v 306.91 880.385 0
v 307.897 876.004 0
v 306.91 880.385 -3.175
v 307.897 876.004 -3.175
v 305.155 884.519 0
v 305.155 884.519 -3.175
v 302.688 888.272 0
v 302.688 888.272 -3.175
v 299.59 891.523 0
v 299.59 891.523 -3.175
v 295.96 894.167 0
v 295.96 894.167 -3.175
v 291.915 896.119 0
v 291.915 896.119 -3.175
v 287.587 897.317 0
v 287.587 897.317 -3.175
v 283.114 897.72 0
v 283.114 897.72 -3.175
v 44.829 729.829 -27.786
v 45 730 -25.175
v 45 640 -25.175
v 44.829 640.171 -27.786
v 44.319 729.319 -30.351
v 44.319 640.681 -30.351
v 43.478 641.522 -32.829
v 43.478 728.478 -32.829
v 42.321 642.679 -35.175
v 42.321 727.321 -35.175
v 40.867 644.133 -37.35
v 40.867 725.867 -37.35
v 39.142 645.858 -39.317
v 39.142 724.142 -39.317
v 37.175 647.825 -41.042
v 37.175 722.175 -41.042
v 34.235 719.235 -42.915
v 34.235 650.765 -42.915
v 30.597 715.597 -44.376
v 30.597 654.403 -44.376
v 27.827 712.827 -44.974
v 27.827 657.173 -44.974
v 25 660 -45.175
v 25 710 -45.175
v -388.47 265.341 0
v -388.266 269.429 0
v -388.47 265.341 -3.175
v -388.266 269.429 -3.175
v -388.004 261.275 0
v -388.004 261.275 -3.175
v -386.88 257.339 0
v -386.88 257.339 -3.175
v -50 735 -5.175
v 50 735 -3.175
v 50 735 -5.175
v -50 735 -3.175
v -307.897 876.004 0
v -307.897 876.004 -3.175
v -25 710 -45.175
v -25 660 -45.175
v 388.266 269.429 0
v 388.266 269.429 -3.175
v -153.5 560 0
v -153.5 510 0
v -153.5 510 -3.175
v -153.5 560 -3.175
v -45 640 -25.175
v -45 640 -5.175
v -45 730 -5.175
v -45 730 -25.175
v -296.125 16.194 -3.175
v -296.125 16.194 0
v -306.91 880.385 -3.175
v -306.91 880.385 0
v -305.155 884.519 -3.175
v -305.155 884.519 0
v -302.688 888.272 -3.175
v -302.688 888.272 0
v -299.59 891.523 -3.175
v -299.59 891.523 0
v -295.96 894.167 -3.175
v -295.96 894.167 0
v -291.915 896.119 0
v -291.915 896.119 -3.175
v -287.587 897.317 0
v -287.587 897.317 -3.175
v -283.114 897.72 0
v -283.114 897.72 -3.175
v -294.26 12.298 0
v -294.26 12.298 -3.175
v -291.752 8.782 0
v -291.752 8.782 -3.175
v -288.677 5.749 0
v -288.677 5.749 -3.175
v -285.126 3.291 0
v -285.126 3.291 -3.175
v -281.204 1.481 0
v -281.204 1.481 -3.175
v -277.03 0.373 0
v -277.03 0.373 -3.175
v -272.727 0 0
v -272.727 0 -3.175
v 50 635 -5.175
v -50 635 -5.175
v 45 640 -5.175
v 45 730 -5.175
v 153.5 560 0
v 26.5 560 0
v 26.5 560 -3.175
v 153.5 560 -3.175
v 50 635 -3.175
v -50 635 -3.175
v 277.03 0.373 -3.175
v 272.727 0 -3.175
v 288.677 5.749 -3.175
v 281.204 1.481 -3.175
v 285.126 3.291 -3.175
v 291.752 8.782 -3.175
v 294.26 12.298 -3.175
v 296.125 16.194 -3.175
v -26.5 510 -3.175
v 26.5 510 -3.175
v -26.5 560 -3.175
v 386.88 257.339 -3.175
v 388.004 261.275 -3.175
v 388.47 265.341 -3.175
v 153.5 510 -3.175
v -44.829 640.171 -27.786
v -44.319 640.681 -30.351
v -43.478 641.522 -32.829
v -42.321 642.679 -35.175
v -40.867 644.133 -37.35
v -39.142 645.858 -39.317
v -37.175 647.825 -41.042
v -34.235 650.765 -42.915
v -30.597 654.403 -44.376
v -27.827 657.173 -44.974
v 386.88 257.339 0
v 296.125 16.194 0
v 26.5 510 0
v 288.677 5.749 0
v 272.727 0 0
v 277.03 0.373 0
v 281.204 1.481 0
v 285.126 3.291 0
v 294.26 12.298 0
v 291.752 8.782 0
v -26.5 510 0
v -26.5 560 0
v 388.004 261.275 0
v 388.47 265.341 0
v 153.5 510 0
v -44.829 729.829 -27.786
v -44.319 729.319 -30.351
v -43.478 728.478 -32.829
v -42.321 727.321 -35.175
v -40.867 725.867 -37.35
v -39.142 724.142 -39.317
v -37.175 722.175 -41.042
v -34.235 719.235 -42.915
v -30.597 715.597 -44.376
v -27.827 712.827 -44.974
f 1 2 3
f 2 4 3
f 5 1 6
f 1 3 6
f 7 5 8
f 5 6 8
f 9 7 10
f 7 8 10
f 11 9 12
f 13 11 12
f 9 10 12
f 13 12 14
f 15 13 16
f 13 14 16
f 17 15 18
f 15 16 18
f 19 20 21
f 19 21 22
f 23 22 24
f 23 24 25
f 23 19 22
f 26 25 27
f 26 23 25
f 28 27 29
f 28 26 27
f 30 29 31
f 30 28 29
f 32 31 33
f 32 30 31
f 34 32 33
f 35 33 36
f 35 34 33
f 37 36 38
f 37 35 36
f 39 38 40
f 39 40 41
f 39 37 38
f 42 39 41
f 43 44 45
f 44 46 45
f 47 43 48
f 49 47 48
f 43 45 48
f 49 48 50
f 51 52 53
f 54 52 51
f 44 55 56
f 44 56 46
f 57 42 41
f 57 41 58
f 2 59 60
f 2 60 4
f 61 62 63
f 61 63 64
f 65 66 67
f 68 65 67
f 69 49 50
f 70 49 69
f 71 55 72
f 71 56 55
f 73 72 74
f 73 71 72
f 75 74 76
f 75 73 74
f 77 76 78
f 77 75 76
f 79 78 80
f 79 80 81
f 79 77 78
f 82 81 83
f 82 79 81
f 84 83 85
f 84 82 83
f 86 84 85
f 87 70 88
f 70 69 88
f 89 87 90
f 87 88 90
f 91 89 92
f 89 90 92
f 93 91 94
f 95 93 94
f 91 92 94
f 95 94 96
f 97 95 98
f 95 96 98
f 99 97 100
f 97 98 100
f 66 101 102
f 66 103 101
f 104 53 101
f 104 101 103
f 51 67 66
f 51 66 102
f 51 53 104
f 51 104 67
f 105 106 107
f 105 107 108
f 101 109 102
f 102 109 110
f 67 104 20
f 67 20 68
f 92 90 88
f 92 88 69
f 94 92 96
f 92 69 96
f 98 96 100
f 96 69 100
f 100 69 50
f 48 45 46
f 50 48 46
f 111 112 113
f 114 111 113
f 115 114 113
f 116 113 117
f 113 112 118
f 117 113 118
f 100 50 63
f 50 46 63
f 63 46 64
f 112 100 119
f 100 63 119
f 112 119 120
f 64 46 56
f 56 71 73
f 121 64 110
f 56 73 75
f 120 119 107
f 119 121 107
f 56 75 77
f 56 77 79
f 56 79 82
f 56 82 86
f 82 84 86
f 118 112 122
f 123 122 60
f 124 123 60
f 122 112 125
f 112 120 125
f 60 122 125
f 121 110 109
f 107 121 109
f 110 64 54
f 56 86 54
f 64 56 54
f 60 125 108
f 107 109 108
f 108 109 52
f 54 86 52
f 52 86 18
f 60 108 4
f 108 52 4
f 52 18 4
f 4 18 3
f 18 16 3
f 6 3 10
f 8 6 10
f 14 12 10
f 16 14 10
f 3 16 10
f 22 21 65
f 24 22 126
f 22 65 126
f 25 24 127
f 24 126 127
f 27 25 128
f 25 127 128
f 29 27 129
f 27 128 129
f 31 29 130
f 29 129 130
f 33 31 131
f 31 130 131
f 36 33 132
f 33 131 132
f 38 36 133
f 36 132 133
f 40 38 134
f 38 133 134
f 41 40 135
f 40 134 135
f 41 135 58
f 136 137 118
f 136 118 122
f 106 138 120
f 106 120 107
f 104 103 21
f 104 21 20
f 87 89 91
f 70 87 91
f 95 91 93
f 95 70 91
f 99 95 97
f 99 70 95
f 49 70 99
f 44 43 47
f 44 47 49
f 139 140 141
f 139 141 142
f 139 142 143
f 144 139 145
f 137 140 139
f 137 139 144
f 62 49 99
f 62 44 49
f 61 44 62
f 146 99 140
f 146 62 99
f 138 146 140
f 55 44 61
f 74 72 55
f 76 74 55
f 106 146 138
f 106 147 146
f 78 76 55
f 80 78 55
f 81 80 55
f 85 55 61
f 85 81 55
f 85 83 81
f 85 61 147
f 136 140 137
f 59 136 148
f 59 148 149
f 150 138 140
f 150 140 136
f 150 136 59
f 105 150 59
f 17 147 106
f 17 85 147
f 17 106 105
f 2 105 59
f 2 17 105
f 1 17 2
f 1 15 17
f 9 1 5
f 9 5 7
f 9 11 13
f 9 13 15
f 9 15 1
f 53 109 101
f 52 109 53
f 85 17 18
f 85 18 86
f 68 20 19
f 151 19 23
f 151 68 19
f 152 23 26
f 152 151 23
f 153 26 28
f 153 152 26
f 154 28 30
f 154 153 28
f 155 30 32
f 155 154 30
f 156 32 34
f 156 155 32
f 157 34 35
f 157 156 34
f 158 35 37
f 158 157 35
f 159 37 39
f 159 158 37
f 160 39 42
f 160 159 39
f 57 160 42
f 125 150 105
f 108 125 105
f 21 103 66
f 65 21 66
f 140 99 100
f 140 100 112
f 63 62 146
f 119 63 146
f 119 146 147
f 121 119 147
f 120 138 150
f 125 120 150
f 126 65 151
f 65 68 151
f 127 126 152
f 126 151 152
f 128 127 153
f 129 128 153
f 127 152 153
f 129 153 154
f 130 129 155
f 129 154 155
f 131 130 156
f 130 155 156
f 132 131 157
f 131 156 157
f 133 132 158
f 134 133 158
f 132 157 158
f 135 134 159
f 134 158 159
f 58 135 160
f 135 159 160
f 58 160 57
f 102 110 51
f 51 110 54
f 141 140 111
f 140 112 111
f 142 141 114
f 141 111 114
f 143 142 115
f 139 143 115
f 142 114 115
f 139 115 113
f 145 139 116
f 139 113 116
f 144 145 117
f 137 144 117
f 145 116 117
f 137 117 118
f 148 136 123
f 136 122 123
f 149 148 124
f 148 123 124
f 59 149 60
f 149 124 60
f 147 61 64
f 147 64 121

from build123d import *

# Parameters (mm, degrees)
BASE_FLANGE1_DEPTH  = 3.175
FILLET1_R           = 25
SKETCH2_W           = 127
SKETCH2_H           = 50
CUT_EXTRUDE1_DEPTH  = 10
SKETCH3_W           = 100
SKETCH3_H           = 100
BOSS_EXTRUDE1_DEPTH = 2
SKETCH4_W           = 90
SKETCH4_H           = 90
BOSS_EXTRUDE2_DEPTH = 40
FILLET3_R           = 20


# Sheet-metal steps are written as plain solids
with BuildPart() as part:
    # Sketch1 → Base-Flange1 (new body)
    with BuildSketch(Plane.XY):
        Polygon((-305.02, 897.72), (-389.09, 263.21), (-290.03, 0), (290.03, 0), (389.09, 263.21), (305.02, 897.72), align=None)
    extrude(amount=-BASE_FLANGE1_DEPTH)

    # Fillet1
    fillet1_edges = [part.edges().sort_by_distance(p)[0] for p in [
        (-290.03, 0, -1.5875),
        (-389.09, 263.21, -1.5875),
        (-305.02, 897.72, -1.5875),
        (305.02, 897.72, -1.5875),
        (389.09, 263.21, -1.5875),
        (290.03, 0, -1.5875),
    ]]
    fillet(fillet1_edges, radius=FILLET1_R)

    # Sketch2 → Cut-Extrude1 (cut)
    with BuildSketch(Plane.XY):
        with Locations((-90, 535)):
            Rectangle(SKETCH2_W, SKETCH2_H)
        with Locations((90, 535)):
            Rectangle(SKETCH2_W, SKETCH2_H)
    extrude(amount=-CUT_EXTRUDE1_DEPTH, mode=Mode.SUBTRACT)

    # Sketch3 → Boss-Extrude1 (add)
    with BuildSketch(Plane(origin=(0, 0, -3.175), x_dir=(-1, 0, 0), z_dir=(0, 0, -1))):
        with Locations((0, 685)):
            Rectangle(SKETCH3_W, SKETCH3_H)
    extrude(amount=BOSS_EXTRUDE1_DEPTH)

    # Sketch4 → Boss-Extrude2 (add)
    with BuildSketch(Plane(origin=(0, 0, -5.175), x_dir=(-1, 0, 0), z_dir=(0, 0, -1))):
        with Locations((0, 685)):
            Rectangle(SKETCH4_W, SKETCH4_H)
    extrude(amount=BOSS_EXTRUDE2_DEPTH)

    # Fillet3
    fillet3_edges = [part.edges().sort_by_distance(p)[0] for p in [
        (-45, 685, -45.175),
        (0, 730, -45.175),
        (45, 685, -45.175),
        (0, 640, -45.175),
    ]]
    fillet(fillet3_edges, radius=FILLET3_R)


solid = part.part
